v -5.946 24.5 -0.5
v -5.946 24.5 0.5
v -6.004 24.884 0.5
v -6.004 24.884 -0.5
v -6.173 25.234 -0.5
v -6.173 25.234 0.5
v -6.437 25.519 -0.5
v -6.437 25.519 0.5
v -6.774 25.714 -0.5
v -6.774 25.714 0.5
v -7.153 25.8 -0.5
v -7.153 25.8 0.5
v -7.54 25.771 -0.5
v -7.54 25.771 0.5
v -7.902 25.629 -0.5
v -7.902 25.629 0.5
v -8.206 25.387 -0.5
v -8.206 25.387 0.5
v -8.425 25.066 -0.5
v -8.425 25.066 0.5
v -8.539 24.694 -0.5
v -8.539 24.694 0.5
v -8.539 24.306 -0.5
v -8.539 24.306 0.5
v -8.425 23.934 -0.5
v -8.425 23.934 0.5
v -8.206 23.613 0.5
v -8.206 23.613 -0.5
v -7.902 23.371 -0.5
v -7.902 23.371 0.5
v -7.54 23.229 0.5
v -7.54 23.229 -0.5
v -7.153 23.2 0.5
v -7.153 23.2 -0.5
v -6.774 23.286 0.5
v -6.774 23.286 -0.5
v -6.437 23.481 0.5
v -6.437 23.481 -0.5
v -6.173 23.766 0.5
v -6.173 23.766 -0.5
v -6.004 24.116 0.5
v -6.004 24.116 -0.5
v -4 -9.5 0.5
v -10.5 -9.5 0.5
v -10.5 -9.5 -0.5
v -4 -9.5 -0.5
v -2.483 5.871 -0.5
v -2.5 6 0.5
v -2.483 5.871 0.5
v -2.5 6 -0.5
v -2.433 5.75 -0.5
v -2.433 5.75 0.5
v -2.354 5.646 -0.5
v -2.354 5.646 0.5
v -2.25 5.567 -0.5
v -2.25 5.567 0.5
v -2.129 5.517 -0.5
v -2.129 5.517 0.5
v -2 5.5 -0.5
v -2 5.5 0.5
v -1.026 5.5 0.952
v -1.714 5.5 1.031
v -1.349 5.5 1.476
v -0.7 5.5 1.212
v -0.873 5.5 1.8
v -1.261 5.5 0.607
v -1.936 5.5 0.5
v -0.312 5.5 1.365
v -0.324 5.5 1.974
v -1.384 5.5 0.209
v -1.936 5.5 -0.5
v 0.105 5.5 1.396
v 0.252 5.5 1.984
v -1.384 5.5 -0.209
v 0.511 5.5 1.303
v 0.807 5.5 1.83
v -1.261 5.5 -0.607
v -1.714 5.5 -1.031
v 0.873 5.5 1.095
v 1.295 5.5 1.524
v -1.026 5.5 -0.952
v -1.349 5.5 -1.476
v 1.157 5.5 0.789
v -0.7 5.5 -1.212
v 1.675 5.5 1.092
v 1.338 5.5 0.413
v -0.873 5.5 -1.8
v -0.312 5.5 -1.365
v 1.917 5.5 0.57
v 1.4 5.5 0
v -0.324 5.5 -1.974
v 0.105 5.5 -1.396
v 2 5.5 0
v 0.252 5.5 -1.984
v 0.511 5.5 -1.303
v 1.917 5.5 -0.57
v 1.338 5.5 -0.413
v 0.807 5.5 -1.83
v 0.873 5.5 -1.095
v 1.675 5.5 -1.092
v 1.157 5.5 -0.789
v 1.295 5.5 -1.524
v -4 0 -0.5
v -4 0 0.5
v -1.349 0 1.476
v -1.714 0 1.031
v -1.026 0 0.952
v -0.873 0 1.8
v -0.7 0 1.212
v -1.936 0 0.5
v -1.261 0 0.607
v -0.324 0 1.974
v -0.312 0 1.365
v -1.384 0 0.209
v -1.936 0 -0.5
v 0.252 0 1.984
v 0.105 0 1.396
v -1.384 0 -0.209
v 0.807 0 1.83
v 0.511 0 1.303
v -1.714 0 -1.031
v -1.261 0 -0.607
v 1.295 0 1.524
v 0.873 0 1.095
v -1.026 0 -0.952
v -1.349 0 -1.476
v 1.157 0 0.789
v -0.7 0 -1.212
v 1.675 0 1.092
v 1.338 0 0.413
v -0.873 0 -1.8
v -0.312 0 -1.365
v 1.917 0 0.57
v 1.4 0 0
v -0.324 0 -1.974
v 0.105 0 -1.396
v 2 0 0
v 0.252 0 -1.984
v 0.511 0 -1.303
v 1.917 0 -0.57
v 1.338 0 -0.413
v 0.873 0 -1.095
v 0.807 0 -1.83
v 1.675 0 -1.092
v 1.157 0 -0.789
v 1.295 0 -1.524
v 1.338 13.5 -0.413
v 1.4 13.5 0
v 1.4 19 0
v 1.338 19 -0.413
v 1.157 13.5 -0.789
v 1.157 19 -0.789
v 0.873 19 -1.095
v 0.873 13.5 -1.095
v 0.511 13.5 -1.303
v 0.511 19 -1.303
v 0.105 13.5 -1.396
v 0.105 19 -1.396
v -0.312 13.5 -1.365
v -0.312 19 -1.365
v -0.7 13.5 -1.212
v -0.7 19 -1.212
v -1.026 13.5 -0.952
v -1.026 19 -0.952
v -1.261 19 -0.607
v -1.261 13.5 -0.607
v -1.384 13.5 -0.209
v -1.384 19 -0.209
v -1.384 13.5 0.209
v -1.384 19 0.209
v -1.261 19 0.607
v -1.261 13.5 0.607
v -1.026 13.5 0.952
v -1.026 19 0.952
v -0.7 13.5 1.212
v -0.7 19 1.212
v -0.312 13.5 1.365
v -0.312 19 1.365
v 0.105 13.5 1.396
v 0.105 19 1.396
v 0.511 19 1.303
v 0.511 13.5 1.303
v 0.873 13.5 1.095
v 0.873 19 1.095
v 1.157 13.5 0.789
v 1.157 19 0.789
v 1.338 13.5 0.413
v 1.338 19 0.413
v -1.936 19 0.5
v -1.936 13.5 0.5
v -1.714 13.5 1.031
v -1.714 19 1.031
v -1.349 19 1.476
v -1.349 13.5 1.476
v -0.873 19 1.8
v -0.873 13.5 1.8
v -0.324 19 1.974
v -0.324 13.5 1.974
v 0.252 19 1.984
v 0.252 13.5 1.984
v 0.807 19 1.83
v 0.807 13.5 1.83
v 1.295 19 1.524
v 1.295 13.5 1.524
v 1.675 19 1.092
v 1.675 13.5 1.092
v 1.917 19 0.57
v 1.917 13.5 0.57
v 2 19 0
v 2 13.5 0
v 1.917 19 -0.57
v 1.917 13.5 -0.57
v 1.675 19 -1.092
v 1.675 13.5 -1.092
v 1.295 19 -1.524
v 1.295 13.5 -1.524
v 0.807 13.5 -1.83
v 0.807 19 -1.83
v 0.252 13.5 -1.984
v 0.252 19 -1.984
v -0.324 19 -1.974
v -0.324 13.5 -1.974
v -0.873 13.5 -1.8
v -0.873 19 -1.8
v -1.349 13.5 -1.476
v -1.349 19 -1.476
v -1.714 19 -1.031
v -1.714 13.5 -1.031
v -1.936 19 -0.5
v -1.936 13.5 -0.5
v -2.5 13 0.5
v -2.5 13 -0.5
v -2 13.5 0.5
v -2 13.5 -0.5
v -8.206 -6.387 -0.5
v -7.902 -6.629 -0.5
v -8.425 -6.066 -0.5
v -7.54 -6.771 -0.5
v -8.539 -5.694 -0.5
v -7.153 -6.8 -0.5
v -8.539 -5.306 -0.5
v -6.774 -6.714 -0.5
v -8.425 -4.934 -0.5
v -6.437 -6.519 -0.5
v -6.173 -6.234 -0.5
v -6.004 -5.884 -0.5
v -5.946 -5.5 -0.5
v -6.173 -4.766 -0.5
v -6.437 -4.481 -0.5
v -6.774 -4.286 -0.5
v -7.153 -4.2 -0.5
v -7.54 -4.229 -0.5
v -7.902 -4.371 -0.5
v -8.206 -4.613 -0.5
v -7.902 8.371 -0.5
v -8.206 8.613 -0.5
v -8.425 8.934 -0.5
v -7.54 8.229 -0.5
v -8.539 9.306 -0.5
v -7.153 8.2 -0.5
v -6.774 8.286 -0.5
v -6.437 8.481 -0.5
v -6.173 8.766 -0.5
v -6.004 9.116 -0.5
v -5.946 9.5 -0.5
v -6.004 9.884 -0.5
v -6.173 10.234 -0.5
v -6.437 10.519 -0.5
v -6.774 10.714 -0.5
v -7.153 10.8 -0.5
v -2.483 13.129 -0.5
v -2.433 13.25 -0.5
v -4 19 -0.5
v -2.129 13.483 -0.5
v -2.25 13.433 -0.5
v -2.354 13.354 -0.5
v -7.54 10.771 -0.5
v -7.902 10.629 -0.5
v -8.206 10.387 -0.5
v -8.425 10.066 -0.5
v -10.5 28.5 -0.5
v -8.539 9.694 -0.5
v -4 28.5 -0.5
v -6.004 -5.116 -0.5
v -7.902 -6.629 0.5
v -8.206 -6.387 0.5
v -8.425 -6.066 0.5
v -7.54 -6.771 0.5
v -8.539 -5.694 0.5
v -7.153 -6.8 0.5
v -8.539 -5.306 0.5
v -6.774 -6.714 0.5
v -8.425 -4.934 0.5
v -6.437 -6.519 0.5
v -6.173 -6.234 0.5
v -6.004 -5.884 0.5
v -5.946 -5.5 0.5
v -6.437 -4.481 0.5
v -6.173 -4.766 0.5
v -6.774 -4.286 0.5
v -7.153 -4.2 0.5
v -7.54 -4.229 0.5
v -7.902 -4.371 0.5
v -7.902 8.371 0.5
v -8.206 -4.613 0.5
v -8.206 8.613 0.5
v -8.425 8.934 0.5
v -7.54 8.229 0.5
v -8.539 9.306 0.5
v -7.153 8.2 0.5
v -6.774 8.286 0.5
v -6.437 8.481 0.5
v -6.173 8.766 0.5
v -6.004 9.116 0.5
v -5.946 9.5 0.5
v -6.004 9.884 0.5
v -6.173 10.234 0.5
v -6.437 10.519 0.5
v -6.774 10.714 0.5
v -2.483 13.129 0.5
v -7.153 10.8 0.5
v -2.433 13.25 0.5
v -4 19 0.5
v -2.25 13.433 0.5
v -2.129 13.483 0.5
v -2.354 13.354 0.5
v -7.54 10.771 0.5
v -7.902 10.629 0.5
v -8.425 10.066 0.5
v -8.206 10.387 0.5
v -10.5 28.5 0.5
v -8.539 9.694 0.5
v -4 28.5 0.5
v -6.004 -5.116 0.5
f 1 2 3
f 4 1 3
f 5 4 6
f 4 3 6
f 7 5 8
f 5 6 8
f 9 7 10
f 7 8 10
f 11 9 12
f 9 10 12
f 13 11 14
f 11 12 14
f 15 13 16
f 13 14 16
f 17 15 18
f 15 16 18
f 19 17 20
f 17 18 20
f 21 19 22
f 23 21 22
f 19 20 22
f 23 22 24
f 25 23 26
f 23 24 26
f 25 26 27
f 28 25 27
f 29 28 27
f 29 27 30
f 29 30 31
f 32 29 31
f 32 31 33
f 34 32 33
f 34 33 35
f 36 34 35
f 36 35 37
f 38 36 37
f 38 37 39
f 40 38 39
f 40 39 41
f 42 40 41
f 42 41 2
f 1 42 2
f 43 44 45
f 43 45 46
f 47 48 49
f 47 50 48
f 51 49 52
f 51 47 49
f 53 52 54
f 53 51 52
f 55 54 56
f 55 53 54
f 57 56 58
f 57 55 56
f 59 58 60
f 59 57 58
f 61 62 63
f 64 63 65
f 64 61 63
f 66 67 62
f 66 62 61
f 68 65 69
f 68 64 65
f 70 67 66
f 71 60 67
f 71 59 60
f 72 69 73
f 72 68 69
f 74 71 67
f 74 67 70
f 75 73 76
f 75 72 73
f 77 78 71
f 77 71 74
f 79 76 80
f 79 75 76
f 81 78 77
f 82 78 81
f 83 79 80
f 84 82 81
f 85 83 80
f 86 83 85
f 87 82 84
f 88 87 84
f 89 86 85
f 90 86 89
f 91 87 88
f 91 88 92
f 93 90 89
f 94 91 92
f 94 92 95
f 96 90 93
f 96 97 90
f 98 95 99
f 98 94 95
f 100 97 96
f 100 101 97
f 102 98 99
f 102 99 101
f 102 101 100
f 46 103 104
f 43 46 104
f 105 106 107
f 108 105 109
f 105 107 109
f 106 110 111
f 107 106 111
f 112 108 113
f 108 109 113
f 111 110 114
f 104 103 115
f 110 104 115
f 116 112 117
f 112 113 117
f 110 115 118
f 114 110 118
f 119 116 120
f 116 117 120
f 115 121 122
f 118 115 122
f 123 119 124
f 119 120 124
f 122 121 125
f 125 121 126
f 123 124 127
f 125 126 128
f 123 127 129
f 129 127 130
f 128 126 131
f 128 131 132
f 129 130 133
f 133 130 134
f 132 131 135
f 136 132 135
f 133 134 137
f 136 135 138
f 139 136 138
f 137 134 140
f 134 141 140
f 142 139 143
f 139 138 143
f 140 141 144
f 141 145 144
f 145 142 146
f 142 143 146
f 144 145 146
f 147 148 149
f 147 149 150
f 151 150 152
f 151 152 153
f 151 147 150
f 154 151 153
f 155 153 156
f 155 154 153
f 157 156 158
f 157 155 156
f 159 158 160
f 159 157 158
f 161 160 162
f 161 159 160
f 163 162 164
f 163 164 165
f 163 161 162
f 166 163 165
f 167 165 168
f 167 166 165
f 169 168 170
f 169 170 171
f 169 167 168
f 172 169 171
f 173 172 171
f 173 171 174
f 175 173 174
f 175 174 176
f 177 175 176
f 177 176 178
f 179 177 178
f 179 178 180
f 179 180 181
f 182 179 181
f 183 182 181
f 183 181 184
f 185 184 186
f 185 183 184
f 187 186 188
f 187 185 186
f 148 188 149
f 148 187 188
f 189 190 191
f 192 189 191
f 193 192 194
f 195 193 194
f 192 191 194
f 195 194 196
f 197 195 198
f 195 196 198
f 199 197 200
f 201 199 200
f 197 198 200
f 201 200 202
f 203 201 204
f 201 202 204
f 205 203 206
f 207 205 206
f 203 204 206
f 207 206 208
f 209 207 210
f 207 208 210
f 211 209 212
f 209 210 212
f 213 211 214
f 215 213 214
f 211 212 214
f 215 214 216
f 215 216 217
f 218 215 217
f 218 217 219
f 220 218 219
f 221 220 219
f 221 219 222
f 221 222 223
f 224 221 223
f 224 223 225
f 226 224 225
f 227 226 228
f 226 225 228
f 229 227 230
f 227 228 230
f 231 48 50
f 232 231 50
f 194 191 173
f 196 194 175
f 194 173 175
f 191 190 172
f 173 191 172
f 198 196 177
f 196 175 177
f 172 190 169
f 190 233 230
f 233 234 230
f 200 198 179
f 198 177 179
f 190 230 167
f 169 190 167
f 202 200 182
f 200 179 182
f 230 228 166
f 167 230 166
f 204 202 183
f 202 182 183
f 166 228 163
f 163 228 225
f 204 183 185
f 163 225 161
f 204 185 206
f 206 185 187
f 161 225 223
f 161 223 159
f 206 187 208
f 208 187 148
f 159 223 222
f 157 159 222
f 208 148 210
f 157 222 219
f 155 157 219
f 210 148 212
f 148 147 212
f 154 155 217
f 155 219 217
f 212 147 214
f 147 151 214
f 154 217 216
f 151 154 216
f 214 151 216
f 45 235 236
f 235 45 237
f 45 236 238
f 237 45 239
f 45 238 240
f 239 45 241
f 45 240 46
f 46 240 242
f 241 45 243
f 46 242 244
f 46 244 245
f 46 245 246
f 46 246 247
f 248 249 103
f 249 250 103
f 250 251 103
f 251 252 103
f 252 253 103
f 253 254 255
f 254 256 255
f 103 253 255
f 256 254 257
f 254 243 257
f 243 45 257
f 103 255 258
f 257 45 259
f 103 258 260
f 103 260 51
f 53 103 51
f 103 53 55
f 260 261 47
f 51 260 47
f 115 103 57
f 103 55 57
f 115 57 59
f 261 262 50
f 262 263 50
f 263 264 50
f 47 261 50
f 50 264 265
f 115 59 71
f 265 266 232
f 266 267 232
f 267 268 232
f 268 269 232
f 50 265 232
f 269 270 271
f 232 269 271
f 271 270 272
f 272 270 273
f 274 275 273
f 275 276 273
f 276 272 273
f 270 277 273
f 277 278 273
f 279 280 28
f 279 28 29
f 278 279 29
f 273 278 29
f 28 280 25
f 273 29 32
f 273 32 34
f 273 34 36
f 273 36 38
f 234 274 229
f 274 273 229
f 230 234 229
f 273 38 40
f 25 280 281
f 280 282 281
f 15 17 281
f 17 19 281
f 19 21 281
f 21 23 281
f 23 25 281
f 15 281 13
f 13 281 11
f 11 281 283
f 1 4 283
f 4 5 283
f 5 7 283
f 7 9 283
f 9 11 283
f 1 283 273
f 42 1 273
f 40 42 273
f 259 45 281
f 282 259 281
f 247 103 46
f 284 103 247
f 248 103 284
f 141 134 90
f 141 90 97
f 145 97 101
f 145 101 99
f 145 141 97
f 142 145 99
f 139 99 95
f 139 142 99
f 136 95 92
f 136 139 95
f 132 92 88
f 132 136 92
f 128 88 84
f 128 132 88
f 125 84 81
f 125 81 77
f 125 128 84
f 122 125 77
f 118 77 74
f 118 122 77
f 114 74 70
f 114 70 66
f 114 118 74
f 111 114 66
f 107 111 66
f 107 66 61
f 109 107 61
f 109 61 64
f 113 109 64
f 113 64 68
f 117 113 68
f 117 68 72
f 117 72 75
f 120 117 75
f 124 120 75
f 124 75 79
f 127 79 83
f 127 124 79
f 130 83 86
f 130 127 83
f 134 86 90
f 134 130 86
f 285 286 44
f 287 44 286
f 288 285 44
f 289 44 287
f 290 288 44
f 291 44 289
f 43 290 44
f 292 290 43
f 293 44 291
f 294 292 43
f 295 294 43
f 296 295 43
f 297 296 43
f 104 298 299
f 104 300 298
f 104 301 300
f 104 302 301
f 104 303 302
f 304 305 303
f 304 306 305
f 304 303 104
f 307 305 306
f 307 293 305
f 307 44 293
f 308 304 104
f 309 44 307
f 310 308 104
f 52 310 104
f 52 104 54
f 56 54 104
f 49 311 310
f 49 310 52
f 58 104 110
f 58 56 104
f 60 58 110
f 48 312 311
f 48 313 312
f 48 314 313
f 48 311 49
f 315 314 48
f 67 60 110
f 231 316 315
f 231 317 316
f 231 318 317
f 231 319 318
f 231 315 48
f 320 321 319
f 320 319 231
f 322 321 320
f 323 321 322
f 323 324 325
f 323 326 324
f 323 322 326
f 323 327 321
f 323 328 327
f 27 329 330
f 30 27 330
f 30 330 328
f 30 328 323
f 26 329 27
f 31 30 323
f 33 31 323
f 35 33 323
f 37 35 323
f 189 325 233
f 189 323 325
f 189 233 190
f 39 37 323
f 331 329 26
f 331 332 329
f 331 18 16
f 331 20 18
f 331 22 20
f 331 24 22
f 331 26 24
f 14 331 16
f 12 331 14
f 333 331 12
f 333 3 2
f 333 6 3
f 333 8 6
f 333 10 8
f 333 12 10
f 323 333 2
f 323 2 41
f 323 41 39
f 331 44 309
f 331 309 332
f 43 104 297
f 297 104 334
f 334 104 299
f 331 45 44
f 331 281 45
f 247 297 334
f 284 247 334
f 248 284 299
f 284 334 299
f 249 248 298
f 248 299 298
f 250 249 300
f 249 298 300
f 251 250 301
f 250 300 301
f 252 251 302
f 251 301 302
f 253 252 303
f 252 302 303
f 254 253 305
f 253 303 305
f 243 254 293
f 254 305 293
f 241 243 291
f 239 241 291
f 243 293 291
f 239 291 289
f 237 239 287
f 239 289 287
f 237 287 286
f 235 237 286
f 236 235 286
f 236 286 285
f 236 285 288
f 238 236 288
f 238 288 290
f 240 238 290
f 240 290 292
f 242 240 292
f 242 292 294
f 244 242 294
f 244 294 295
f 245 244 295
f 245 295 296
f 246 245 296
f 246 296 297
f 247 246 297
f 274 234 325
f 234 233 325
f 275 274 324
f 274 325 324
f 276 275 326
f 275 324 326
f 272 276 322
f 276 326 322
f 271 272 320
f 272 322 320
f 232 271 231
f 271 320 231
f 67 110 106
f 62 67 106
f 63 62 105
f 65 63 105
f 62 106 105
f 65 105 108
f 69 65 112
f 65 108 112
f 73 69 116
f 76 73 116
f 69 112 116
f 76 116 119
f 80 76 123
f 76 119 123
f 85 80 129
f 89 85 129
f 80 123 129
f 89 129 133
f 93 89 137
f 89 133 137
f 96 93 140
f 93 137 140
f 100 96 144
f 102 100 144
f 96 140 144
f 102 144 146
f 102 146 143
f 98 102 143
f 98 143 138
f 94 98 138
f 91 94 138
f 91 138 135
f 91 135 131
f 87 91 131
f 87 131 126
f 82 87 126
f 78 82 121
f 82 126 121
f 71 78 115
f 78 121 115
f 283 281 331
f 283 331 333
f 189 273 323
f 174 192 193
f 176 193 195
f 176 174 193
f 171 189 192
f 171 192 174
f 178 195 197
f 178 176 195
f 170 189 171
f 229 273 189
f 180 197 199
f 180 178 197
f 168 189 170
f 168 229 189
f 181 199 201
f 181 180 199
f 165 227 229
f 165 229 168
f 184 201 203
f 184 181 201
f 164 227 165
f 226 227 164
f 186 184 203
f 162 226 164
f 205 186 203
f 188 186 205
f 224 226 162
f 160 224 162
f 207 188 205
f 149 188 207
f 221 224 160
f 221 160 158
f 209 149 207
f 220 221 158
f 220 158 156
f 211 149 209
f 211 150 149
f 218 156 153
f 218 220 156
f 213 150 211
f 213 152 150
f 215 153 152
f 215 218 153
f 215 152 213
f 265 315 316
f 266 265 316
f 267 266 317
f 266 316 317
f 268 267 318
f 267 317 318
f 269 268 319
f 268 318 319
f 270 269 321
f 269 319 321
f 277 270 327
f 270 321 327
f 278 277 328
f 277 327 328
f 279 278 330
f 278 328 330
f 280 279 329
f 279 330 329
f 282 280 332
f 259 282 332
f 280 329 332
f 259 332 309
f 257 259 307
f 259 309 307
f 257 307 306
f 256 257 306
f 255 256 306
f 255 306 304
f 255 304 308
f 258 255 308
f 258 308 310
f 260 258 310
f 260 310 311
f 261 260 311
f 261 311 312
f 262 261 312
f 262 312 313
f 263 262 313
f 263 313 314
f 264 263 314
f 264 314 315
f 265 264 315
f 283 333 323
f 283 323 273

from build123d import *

# Parameters (mm, degrees)
SKETCH1_R           = 1.4
BOSS_EXTRUDE1_DEPTH = 5.5
SKETCH2_R           = 1.4
BOSS_EXTRUDE2_DEPTH = 5.5
SKETCH3_W           = 8
SKETCH3_H           = 1
BOSS_EXTRUDE3_DEPTH = 13.5
SKETCH4_W           = 6.5
SKETCH4_H           = 1
BOSS_EXTRUDE4_DEPTH = 9.5
SKETCH5_W           = 6.5
SKETCH5_H           = 1
BOSS_EXTRUDE5_DEPTH = 9.5
FILLET1_R           = 0.5
CUT_EXTRUDE1_REACH  = 4.5
SKETCH6_R           = 1.303868107


with BuildPart() as part:
    # Sketch1 → Boss-Extrude1 (new body)
    with BuildSketch(Plane(origin=(0, 0, 0), x_dir=(1, 0, 0), z_dir=(0, 1, 0))):
        with BuildLine():
            Line((-1.936491673, 0.5), (-10.5, 0.5))
            Line((-10.5, 0.5), (-10.5, -0.5))
            Line((-10.5, -0.5), (-1.936491673, -0.5))
            ThreePointArc((-1.936491673, -0.5), (2, 0), (-1.936491673, 0.5))
        make_face()
        Circle(SKETCH1_R, mode=Mode.SUBTRACT)
    extrude(amount=BOSS_EXTRUDE1_DEPTH)



with BuildPart() as body_2:
    # Sketch2 → Boss-Extrude2 (new body)
    with BuildSketch(Plane(origin=(0, 13.5, 0), x_dir=(1, 0, 0), z_dir=(0, 1, 0))):
        with BuildLine():
            Line((-1.936491673, 0.5), (-10.5, 0.5))
            Line((-10.5, 0.5), (-10.5, -0.5))
            Line((-10.5, -0.5), (-1.936491673, -0.5))
            ThreePointArc((-1.936491673, -0.5), (2, 0), (-1.936491673, 0.5))
        make_face()
        Circle(SKETCH2_R, mode=Mode.SUBTRACT)
    extrude(amount=BOSS_EXTRUDE2_DEPTH)


with BuildPart() as part_1:
    add(part.part)

    add(body_2.part)  # Boss-Extrude3 merges body 2
    # Sketch3 → Boss-Extrude3 (add)
    with BuildSketch(Plane(origin=(0, 5.5, 0), x_dir=(1, 0, 0), z_dir=(0, 1, 0))):
        with Locations((-6.5, 0)):
            Rectangle(SKETCH3_W, SKETCH3_H)
    extrude(amount=BOSS_EXTRUDE3_DEPTH)

    # Sketch4 → Boss-Extrude4 (add)
    with BuildSketch(Plane(origin=(0, 19, 0), x_dir=(1, 0, 0), z_dir=(0, 1, 0))):
        with Locations((-7.25, 0)):
            Rectangle(SKETCH4_W, SKETCH4_H)
    extrude(amount=BOSS_EXTRUDE4_DEPTH)

    # Sketch5 → Boss-Extrude5 (add)
    with BuildSketch(Plane.XZ):
        with Locations((-7.25, 0)):
            Rectangle(SKETCH5_W, SKETCH5_H)
    extrude(amount=BOSS_EXTRUDE5_DEPTH)

    # Fillet1
    fillet1_edges = [part_1.edges().sort_by_distance(p)[0] for p in [
        (-2.5, 13.5, 0),
        (-2.5, 5.5, 0),
    ]]
    fillet(fillet1_edges, radius=FILLET1_R)

    # Sketch6 → Cut-Extrude1 (cut, up to next)
    with BuildSketch(Plane.XY.offset(0.5), mode=Mode.PRIVATE) as cut_extrude1_sk1:
        with Locations((-7.25, -5.5)):
            Circle(SKETCH6_R)
    cut_extrude1_tool1 = extrude(cut_extrude1_sk1.sketch, amount=-CUT_EXTRUDE1_REACH, mode=Mode.PRIVATE) & part_1.part
    add(cut_extrude1_tool1.solids().sort_by_distance((-7.25, -5.5, 0.5))[0], mode=Mode.SUBTRACT)
    # Sketch6 → Cut-Extrude1 (cut, up to next)
    with BuildSketch(Plane.XY.offset(0.5), mode=Mode.PRIVATE) as cut_extrude1_sk2:
        with Locations((-7.25, 9.5)):
            Circle(SKETCH6_R)
    cut_extrude1_tool2 = extrude(cut_extrude1_sk2.sketch, amount=-CUT_EXTRUDE1_REACH, mode=Mode.PRIVATE) & part_1.part
    add(cut_extrude1_tool2.solids().sort_by_distance((-7.25, 9.5, 0.5))[0], mode=Mode.SUBTRACT)
    # Sketch6 → Cut-Extrude1 (cut, up to next)
    with BuildSketch(Plane.XY.offset(0.5), mode=Mode.PRIVATE) as cut_extrude1_sk3:
        with Locations((-7.25, 24.5)):
            Circle(SKETCH6_R)
    cut_extrude1_tool3 = extrude(cut_extrude1_sk3.sketch, amount=-CUT_EXTRUDE1_REACH, mode=Mode.PRIVATE) & part_1.part
    add(cut_extrude1_tool3.solids().sort_by_distance((-7.25, 24.5, 0.5))[0], mode=Mode.SUBTRACT)


solid = part_1.part
